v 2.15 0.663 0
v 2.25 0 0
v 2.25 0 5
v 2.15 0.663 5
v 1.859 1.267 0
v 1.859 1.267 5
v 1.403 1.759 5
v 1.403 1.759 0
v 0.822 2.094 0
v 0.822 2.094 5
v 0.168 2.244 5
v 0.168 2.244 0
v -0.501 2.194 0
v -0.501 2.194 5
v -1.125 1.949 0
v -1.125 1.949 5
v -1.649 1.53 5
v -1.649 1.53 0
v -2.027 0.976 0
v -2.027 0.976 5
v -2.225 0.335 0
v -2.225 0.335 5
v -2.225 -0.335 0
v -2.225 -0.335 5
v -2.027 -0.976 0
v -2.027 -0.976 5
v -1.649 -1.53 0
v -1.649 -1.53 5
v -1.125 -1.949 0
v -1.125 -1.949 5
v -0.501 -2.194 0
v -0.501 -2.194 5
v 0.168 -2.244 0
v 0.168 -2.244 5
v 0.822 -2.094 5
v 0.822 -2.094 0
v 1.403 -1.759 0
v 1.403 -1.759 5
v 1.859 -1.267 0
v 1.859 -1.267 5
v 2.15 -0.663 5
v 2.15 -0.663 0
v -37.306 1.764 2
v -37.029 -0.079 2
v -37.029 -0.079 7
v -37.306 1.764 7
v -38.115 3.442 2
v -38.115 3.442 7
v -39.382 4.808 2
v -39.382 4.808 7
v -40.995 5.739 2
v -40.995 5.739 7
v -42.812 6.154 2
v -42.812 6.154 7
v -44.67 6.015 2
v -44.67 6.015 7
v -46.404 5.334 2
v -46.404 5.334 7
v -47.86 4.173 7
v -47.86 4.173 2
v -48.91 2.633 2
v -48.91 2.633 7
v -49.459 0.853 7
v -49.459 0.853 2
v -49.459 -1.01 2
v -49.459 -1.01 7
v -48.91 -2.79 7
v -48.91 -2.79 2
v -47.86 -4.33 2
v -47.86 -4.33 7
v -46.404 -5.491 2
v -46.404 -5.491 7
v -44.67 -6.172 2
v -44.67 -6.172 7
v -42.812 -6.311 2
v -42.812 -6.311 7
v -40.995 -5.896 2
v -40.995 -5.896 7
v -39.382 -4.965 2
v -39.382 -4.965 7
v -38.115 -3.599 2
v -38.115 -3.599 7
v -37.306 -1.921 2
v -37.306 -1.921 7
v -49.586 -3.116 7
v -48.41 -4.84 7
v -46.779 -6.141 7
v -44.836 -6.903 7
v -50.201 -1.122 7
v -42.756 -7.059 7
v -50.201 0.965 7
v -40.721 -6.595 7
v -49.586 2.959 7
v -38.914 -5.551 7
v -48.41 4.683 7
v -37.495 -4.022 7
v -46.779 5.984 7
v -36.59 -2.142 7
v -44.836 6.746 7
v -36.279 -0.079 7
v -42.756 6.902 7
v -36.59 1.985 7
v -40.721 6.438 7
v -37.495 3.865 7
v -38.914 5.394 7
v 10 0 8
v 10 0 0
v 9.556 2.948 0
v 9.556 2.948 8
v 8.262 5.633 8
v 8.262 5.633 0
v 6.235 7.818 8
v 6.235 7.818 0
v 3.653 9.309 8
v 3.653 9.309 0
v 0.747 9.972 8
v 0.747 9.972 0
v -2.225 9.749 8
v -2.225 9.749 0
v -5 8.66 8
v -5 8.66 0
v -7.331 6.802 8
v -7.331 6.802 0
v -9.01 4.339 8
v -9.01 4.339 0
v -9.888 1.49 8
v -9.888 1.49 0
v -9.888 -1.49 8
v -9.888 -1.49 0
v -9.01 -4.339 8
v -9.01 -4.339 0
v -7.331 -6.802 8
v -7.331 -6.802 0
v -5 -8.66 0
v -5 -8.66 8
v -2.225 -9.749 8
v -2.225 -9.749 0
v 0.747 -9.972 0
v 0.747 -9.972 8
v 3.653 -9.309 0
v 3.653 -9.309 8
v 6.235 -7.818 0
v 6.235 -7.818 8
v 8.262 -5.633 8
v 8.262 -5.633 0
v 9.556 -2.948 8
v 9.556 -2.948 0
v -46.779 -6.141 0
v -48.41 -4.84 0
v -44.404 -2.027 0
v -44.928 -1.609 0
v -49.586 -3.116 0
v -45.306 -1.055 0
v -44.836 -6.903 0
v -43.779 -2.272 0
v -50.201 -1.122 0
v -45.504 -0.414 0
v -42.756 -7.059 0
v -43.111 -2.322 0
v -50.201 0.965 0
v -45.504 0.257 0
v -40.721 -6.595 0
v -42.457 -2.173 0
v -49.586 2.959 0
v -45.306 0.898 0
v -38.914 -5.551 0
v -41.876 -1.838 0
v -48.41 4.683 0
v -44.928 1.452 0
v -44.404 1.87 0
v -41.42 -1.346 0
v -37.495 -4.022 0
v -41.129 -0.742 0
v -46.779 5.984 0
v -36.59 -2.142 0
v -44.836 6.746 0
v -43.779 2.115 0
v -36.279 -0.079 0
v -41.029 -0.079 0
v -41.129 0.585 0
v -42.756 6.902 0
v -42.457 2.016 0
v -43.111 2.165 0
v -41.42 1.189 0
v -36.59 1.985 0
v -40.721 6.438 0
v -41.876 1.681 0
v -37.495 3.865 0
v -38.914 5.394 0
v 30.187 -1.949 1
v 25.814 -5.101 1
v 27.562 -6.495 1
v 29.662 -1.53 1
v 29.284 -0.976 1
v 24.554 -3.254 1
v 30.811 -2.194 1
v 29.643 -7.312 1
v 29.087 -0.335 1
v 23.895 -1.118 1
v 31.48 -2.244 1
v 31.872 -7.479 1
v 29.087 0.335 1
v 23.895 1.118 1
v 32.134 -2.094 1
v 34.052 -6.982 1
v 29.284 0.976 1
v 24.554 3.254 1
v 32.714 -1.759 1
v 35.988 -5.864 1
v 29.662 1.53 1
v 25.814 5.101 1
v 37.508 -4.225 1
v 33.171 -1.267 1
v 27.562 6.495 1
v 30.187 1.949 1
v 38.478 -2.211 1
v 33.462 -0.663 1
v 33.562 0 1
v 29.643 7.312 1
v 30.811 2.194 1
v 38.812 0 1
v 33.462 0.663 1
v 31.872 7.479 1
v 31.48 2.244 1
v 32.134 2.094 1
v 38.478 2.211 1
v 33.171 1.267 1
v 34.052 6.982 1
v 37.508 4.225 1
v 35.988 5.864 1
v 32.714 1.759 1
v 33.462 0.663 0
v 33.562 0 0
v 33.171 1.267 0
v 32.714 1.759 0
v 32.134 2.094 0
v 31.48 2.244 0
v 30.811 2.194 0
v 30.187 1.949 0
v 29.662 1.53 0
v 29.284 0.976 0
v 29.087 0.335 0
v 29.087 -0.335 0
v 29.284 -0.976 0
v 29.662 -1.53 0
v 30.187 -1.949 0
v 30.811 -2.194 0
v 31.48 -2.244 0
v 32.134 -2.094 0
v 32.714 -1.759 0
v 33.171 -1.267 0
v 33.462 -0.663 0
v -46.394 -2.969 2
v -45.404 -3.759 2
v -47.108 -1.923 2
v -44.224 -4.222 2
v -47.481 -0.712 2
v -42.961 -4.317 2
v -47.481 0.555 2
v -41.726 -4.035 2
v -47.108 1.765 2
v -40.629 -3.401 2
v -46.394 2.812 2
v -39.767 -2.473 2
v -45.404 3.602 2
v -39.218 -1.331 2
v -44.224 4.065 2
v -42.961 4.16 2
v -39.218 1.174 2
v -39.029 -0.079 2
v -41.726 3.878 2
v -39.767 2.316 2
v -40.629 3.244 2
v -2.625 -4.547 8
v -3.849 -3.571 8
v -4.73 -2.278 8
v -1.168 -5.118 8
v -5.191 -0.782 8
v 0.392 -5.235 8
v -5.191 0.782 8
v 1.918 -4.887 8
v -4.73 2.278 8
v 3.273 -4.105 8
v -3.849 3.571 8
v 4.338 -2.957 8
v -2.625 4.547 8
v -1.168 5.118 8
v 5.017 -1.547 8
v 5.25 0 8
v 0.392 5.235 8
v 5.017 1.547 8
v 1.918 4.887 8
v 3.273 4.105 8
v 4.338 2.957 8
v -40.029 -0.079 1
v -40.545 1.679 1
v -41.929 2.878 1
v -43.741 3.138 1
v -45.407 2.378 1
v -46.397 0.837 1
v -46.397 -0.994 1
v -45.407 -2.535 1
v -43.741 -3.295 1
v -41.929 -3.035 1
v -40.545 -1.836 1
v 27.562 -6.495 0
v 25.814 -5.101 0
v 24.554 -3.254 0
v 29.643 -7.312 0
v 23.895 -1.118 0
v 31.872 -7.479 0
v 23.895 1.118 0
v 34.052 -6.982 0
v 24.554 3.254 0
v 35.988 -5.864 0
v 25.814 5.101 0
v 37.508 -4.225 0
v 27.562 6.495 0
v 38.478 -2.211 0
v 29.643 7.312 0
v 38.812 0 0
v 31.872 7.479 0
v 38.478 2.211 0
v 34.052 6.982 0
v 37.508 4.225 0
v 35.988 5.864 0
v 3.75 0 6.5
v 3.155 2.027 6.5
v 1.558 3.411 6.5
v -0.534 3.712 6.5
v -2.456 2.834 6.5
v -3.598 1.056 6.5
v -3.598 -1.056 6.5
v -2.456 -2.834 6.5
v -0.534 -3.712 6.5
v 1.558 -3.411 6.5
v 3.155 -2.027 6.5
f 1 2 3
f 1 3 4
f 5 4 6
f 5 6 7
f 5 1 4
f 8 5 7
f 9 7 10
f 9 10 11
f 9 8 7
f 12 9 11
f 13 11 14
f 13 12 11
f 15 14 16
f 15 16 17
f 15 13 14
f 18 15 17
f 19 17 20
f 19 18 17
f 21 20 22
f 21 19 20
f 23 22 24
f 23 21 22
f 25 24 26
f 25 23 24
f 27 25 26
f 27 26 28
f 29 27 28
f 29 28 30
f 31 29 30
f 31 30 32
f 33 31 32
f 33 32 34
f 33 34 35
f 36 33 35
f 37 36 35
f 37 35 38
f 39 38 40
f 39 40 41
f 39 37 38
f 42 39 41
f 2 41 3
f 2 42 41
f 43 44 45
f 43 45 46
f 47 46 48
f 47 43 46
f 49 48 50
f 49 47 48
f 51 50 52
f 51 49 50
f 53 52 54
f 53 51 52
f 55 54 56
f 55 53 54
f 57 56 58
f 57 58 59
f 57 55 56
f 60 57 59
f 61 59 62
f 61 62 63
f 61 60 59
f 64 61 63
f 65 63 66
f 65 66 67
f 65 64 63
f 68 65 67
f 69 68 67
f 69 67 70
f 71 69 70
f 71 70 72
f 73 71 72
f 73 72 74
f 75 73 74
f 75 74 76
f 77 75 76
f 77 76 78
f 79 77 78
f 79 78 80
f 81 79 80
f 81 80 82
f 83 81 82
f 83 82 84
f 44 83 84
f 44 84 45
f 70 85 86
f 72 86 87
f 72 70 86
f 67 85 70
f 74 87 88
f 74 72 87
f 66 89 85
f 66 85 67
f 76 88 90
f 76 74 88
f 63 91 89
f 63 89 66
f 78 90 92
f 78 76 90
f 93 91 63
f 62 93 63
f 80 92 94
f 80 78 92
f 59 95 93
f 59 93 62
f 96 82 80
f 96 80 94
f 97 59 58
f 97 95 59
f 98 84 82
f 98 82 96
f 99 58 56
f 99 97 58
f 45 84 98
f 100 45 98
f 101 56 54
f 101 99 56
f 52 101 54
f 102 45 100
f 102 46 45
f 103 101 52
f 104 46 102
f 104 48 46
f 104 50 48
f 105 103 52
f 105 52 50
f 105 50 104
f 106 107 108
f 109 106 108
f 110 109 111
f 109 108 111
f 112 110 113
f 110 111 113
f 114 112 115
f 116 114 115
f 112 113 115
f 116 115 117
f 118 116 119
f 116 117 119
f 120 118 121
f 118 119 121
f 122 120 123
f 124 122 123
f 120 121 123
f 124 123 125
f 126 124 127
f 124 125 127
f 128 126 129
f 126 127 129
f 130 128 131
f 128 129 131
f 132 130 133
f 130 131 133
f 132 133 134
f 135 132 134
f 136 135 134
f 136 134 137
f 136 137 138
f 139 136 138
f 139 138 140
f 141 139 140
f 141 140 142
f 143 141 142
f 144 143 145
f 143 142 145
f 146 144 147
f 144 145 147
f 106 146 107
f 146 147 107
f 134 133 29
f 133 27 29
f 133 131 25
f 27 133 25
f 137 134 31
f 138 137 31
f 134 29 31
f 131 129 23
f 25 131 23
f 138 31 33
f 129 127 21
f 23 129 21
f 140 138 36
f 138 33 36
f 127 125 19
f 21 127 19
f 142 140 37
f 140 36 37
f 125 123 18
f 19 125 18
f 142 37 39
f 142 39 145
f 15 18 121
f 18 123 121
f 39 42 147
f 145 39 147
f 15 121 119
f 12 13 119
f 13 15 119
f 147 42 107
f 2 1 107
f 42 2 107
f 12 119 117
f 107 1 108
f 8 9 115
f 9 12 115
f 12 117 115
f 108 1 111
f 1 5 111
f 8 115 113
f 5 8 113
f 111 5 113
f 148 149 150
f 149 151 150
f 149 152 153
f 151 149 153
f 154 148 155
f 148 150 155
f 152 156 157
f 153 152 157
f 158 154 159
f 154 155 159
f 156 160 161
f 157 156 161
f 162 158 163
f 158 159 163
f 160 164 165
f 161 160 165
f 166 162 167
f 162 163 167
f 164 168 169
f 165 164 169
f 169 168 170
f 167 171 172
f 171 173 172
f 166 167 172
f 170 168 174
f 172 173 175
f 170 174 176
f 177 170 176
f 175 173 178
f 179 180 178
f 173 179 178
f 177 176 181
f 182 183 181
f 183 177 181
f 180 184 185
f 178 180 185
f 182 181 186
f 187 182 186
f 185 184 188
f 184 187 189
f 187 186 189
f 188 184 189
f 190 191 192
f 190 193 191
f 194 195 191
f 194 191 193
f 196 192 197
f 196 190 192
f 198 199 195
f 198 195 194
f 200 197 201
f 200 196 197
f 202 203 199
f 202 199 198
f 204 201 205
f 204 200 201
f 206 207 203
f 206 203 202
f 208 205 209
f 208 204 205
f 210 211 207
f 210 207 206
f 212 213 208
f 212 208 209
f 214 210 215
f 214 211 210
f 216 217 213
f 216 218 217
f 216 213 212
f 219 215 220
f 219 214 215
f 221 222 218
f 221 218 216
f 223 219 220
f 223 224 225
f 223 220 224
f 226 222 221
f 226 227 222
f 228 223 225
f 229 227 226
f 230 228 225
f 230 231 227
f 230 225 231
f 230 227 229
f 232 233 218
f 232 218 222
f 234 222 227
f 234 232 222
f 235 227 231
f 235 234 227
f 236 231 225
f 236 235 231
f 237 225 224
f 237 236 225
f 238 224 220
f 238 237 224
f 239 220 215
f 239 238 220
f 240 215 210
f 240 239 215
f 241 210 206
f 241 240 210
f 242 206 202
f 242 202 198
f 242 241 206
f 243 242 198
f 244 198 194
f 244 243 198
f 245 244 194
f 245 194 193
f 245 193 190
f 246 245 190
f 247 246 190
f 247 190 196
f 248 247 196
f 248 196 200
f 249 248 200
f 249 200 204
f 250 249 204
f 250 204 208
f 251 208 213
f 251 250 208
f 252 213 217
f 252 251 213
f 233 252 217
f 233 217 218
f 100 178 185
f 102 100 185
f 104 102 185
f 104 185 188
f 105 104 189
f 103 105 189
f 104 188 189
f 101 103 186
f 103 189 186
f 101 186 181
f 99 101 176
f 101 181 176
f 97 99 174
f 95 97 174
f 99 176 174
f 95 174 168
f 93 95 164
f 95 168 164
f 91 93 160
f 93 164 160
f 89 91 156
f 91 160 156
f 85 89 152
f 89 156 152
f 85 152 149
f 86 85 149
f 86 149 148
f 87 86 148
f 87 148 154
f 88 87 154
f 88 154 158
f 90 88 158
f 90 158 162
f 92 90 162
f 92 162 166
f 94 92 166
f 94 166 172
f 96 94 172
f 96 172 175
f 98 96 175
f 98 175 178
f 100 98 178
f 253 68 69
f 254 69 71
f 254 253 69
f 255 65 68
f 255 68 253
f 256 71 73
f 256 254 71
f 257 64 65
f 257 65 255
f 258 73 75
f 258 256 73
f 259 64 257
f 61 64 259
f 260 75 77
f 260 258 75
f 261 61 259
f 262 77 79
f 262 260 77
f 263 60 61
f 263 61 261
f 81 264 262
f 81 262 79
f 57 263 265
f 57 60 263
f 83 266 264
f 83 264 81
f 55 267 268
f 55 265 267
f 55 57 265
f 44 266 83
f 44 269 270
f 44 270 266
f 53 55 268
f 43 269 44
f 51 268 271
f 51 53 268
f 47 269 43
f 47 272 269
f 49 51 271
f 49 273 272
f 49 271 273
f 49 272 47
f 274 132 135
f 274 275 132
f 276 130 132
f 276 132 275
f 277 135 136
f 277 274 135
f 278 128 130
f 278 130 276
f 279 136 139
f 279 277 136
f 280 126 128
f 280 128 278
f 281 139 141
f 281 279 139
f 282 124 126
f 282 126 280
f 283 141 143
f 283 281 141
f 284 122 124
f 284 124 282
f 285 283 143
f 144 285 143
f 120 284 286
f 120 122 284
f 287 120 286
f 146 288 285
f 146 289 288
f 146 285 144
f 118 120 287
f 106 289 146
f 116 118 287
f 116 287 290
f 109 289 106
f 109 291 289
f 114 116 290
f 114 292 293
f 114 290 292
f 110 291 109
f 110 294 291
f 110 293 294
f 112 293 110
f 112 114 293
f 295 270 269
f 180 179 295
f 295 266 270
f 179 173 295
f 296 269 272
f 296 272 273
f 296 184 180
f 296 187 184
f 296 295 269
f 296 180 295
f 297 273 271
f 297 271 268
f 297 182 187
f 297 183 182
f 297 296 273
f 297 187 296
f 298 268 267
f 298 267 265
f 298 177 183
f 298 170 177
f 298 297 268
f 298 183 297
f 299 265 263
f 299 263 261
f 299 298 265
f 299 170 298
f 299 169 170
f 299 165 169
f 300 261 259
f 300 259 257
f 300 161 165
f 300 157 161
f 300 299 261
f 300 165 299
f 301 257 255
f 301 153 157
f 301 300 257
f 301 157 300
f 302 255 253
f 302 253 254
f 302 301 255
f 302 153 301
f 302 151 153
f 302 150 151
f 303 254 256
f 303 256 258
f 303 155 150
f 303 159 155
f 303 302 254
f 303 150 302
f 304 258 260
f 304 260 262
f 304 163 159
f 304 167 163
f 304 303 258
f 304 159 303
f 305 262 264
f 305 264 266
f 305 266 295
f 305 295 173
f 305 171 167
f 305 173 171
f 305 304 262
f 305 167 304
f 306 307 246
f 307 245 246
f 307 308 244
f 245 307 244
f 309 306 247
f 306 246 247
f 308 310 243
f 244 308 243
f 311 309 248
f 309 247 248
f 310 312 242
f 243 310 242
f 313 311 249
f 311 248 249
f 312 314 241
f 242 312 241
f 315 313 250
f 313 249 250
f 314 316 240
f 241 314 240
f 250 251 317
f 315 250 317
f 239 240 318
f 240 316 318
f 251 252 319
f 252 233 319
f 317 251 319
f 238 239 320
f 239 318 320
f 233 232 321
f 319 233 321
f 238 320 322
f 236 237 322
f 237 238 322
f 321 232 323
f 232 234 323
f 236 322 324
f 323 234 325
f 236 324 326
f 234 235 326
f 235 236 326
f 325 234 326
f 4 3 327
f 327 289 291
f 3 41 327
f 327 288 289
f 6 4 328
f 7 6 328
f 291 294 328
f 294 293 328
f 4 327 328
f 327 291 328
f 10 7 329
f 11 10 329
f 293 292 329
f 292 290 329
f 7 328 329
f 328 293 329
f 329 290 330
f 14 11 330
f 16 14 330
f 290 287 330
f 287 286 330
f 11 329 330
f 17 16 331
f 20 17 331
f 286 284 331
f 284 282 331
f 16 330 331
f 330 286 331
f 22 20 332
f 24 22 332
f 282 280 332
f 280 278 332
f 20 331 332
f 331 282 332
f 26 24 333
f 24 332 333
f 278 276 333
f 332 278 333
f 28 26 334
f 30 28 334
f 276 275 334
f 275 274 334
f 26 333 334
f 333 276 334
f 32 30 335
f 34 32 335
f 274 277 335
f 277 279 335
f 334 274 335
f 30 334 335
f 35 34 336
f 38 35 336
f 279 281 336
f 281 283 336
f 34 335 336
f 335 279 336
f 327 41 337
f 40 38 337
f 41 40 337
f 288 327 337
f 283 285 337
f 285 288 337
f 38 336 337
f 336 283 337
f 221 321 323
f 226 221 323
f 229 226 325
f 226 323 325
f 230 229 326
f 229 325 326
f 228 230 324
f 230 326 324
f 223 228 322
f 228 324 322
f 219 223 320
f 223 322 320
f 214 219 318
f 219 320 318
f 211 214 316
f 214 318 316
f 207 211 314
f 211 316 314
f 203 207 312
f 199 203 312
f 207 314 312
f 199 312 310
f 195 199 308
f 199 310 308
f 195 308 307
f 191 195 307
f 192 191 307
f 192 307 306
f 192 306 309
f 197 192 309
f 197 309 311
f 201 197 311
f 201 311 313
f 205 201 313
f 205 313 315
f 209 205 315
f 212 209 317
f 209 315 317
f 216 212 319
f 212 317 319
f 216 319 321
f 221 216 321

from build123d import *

# Parameters (mm, degrees)
F0_R     = 10
F0_R_2   = 2.25
F1_DEPTH = 8
F2_SIZE  = 3
F0_R_3   = 7.5
F3_DEPTH = 1
F0_R_4   = 7
F0_R_5   = 6.25
F4_DEPTH = 2
F5_DEPTH = 7
F6_SIZE  = 1.99999


# Not quite as in the source:
# - a fillet or chamfer is up to 0.001 mm smaller than in the source, because OpenCascade refuses the exact size


with BuildPart() as f1:
    # F0 (on Top) → F1 (new body)
    with BuildSketch(Plane.XY):
        Circle(F0_R)
        Circle(F0_R_2, mode=Mode.SUBTRACT)
    extrude(amount=F1_DEPTH)

    # F2
    f2_edges = [f1.edges().sort_by_distance(p)[0] for p in [
        (-2.25, 0, 8),
    ]]
    chamfer(f2_edges, length=F2_SIZE)


with BuildPart() as f3:
    # F0 (on Top) → F3 (new body)
    with BuildSketch(Plane.XY):
        with Locations((31.3115231693, 0)):
            Circle(F0_R_3)
        with Locations((31.3115231693, 0)):
            Circle(F0_R_2, mode=Mode.SUBTRACT)
    extrude(amount=F3_DEPTH)


with BuildPart() as f4:
    # F0 (on Top) → F4 (new body)
    with BuildSketch(Plane.XY):
        with Locations((-43.2787574828, -0.0785332668)):
            Circle(F0_R_4)
        with Locations((-43.2787574828, -0.0785332668)):
            Circle(F0_R_5, mode=Mode.SUBTRACT)
        with Locations((-43.2787574828, -0.0785332668)):
            Circle(F0_R_5)
        with Locations((-43.2787574828, -0.0785332668)):
            Circle(F0_R_2, mode=Mode.SUBTRACT)
    extrude(amount=F4_DEPTH)

    # F0 (on Top) → F5 (join)
    with BuildSketch(Plane.XY):
        with Locations((-43.2787574828, -0.0785332668)):
            Circle(F0_R_4)
        with Locations((-43.2787574828, -0.0785332668)):
            Circle(F0_R_5, mode=Mode.SUBTRACT)
    extrude(amount=F5_DEPTH)

    # F6 (size 2 in the source; OpenCascade refuses exactly that, so slightly less here)
    f6_edges = [f4.edges().sort_by_distance(p)[0] for p in [
        (-45.528757, -0.078533, 2),
    ]]
    chamfer(f6_edges, length=F6_SIZE)


solid = Compound([f1.part, f3.part, f4.part])
